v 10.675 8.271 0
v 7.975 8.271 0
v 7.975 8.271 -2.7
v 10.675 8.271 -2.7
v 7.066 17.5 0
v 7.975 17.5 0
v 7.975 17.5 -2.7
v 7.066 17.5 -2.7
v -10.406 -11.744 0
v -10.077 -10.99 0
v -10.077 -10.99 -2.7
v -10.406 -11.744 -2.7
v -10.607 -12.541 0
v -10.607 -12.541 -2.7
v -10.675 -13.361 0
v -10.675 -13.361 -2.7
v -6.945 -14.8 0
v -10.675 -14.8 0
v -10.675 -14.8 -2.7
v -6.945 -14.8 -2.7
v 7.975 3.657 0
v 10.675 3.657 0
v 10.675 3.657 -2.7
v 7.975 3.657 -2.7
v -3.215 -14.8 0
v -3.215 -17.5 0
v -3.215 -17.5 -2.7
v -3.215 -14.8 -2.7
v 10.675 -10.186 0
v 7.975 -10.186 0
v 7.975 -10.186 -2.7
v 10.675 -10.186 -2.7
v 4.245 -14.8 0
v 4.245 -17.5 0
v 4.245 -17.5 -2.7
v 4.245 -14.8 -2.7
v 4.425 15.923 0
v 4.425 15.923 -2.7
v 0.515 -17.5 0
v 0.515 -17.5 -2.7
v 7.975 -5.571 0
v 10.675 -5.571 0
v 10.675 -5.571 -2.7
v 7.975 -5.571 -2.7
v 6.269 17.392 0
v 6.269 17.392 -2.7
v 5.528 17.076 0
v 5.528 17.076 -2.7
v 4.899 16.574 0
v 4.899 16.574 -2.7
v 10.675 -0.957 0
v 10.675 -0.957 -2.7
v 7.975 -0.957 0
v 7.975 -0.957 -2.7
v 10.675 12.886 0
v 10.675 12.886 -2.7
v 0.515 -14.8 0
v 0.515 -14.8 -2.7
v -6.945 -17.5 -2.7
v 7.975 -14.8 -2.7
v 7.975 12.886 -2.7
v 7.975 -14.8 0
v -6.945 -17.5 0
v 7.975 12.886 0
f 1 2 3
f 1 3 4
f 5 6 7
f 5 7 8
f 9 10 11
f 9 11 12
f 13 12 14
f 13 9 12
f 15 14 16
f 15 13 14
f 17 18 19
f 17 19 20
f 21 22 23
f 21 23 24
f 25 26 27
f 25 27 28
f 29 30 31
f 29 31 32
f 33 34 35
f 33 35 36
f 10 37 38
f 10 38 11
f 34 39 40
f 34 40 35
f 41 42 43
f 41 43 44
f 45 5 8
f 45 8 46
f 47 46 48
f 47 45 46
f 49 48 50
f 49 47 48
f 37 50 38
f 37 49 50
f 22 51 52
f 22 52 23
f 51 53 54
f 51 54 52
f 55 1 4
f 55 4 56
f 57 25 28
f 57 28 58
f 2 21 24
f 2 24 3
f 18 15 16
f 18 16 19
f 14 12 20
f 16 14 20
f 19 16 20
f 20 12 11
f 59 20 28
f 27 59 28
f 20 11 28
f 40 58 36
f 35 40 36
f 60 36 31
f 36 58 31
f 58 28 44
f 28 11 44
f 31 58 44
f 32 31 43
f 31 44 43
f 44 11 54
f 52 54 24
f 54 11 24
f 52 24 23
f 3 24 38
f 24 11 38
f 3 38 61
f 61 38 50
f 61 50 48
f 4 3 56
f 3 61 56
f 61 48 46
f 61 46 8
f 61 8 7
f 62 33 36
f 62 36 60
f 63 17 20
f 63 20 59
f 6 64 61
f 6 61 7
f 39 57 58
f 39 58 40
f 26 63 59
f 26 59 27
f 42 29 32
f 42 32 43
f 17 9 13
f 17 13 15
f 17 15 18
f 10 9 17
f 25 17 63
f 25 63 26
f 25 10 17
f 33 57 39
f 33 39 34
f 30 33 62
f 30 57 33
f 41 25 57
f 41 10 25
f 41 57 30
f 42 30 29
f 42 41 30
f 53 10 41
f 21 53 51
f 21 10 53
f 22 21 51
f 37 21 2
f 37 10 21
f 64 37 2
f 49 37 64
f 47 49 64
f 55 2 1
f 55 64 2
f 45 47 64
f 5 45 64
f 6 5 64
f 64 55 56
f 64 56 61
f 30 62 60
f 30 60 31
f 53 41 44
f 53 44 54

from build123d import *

# Parameters (mm, degrees)
BOSS_EXTRUDE1_DEPTH = 2.7


with BuildPart() as part:
    # Sketch1 → Boss-Extrude1 (new body)
    with BuildSketch(Plane.XY):
        with BuildLine():
            Line((7.975, 17.5), (7.066267392, 17.5))
            ThreePointArc((7.066267392, 17.5), (5.52829673, 17.075780705), (4.425283954, 15.923097495))
            Line((4.425283954, 15.923097495), (-10.076639064, -10.98956215))
            ThreePointArc((-10.076639064, -10.98956215), (-10.52310248, -12.138320442), (-10.675, -13.361391307))
            Line((-10.675, -13.361391307), (-10.675, -14.8))
            Line((-10.675, -14.8), (-6.945, -14.8))
            Line((-6.945, -14.8), (-6.945, -17.5))
            Line((-6.945, -17.5), (-3.215, -17.5))
            Line((-3.215, -17.5), (-3.215, -14.8))
            Line((-3.215, -14.8), (0.515, -14.8))
            Line((0.515, -14.8), (0.515, -17.5))
            Line((0.515, -17.5), (4.245, -17.5))
            Line((4.245, -17.5), (4.245, -14.8))
            Line((4.245, -14.8), (7.975, -14.8))
            Line((7.975, -14.8), (7.975, -10.185714286))
            Line((7.975, -10.185714286), (10.675, -10.185714286))
            Line((10.675, -10.185714286), (10.675, -5.571428571))
            Line((10.675, -5.571428571), (7.975, -5.571428571))
            Line((7.975, -5.571428571), (7.975, -0.957142857))
            Line((7.975, -0.957142857), (10.675, -0.957142857))
            Line((10.675, -0.957142857), (10.675, 3.657142857))
            Line((10.675, 3.657142857), (7.975, 3.657142857))
            Line((7.975, 3.657142857), (7.975, 8.271428571))
            Line((7.975, 8.271428571), (10.675, 8.271428571))
            Line((10.675, 8.271428571), (10.675, 12.885714286))
            Line((10.675, 12.885714286), (7.975, 12.885714286))
            Line((7.975, 12.885714286), (7.975, 17.5))
        make_face()
    extrude(amount=-BOSS_EXTRUDE1_DEPTH)


solid = part.part
